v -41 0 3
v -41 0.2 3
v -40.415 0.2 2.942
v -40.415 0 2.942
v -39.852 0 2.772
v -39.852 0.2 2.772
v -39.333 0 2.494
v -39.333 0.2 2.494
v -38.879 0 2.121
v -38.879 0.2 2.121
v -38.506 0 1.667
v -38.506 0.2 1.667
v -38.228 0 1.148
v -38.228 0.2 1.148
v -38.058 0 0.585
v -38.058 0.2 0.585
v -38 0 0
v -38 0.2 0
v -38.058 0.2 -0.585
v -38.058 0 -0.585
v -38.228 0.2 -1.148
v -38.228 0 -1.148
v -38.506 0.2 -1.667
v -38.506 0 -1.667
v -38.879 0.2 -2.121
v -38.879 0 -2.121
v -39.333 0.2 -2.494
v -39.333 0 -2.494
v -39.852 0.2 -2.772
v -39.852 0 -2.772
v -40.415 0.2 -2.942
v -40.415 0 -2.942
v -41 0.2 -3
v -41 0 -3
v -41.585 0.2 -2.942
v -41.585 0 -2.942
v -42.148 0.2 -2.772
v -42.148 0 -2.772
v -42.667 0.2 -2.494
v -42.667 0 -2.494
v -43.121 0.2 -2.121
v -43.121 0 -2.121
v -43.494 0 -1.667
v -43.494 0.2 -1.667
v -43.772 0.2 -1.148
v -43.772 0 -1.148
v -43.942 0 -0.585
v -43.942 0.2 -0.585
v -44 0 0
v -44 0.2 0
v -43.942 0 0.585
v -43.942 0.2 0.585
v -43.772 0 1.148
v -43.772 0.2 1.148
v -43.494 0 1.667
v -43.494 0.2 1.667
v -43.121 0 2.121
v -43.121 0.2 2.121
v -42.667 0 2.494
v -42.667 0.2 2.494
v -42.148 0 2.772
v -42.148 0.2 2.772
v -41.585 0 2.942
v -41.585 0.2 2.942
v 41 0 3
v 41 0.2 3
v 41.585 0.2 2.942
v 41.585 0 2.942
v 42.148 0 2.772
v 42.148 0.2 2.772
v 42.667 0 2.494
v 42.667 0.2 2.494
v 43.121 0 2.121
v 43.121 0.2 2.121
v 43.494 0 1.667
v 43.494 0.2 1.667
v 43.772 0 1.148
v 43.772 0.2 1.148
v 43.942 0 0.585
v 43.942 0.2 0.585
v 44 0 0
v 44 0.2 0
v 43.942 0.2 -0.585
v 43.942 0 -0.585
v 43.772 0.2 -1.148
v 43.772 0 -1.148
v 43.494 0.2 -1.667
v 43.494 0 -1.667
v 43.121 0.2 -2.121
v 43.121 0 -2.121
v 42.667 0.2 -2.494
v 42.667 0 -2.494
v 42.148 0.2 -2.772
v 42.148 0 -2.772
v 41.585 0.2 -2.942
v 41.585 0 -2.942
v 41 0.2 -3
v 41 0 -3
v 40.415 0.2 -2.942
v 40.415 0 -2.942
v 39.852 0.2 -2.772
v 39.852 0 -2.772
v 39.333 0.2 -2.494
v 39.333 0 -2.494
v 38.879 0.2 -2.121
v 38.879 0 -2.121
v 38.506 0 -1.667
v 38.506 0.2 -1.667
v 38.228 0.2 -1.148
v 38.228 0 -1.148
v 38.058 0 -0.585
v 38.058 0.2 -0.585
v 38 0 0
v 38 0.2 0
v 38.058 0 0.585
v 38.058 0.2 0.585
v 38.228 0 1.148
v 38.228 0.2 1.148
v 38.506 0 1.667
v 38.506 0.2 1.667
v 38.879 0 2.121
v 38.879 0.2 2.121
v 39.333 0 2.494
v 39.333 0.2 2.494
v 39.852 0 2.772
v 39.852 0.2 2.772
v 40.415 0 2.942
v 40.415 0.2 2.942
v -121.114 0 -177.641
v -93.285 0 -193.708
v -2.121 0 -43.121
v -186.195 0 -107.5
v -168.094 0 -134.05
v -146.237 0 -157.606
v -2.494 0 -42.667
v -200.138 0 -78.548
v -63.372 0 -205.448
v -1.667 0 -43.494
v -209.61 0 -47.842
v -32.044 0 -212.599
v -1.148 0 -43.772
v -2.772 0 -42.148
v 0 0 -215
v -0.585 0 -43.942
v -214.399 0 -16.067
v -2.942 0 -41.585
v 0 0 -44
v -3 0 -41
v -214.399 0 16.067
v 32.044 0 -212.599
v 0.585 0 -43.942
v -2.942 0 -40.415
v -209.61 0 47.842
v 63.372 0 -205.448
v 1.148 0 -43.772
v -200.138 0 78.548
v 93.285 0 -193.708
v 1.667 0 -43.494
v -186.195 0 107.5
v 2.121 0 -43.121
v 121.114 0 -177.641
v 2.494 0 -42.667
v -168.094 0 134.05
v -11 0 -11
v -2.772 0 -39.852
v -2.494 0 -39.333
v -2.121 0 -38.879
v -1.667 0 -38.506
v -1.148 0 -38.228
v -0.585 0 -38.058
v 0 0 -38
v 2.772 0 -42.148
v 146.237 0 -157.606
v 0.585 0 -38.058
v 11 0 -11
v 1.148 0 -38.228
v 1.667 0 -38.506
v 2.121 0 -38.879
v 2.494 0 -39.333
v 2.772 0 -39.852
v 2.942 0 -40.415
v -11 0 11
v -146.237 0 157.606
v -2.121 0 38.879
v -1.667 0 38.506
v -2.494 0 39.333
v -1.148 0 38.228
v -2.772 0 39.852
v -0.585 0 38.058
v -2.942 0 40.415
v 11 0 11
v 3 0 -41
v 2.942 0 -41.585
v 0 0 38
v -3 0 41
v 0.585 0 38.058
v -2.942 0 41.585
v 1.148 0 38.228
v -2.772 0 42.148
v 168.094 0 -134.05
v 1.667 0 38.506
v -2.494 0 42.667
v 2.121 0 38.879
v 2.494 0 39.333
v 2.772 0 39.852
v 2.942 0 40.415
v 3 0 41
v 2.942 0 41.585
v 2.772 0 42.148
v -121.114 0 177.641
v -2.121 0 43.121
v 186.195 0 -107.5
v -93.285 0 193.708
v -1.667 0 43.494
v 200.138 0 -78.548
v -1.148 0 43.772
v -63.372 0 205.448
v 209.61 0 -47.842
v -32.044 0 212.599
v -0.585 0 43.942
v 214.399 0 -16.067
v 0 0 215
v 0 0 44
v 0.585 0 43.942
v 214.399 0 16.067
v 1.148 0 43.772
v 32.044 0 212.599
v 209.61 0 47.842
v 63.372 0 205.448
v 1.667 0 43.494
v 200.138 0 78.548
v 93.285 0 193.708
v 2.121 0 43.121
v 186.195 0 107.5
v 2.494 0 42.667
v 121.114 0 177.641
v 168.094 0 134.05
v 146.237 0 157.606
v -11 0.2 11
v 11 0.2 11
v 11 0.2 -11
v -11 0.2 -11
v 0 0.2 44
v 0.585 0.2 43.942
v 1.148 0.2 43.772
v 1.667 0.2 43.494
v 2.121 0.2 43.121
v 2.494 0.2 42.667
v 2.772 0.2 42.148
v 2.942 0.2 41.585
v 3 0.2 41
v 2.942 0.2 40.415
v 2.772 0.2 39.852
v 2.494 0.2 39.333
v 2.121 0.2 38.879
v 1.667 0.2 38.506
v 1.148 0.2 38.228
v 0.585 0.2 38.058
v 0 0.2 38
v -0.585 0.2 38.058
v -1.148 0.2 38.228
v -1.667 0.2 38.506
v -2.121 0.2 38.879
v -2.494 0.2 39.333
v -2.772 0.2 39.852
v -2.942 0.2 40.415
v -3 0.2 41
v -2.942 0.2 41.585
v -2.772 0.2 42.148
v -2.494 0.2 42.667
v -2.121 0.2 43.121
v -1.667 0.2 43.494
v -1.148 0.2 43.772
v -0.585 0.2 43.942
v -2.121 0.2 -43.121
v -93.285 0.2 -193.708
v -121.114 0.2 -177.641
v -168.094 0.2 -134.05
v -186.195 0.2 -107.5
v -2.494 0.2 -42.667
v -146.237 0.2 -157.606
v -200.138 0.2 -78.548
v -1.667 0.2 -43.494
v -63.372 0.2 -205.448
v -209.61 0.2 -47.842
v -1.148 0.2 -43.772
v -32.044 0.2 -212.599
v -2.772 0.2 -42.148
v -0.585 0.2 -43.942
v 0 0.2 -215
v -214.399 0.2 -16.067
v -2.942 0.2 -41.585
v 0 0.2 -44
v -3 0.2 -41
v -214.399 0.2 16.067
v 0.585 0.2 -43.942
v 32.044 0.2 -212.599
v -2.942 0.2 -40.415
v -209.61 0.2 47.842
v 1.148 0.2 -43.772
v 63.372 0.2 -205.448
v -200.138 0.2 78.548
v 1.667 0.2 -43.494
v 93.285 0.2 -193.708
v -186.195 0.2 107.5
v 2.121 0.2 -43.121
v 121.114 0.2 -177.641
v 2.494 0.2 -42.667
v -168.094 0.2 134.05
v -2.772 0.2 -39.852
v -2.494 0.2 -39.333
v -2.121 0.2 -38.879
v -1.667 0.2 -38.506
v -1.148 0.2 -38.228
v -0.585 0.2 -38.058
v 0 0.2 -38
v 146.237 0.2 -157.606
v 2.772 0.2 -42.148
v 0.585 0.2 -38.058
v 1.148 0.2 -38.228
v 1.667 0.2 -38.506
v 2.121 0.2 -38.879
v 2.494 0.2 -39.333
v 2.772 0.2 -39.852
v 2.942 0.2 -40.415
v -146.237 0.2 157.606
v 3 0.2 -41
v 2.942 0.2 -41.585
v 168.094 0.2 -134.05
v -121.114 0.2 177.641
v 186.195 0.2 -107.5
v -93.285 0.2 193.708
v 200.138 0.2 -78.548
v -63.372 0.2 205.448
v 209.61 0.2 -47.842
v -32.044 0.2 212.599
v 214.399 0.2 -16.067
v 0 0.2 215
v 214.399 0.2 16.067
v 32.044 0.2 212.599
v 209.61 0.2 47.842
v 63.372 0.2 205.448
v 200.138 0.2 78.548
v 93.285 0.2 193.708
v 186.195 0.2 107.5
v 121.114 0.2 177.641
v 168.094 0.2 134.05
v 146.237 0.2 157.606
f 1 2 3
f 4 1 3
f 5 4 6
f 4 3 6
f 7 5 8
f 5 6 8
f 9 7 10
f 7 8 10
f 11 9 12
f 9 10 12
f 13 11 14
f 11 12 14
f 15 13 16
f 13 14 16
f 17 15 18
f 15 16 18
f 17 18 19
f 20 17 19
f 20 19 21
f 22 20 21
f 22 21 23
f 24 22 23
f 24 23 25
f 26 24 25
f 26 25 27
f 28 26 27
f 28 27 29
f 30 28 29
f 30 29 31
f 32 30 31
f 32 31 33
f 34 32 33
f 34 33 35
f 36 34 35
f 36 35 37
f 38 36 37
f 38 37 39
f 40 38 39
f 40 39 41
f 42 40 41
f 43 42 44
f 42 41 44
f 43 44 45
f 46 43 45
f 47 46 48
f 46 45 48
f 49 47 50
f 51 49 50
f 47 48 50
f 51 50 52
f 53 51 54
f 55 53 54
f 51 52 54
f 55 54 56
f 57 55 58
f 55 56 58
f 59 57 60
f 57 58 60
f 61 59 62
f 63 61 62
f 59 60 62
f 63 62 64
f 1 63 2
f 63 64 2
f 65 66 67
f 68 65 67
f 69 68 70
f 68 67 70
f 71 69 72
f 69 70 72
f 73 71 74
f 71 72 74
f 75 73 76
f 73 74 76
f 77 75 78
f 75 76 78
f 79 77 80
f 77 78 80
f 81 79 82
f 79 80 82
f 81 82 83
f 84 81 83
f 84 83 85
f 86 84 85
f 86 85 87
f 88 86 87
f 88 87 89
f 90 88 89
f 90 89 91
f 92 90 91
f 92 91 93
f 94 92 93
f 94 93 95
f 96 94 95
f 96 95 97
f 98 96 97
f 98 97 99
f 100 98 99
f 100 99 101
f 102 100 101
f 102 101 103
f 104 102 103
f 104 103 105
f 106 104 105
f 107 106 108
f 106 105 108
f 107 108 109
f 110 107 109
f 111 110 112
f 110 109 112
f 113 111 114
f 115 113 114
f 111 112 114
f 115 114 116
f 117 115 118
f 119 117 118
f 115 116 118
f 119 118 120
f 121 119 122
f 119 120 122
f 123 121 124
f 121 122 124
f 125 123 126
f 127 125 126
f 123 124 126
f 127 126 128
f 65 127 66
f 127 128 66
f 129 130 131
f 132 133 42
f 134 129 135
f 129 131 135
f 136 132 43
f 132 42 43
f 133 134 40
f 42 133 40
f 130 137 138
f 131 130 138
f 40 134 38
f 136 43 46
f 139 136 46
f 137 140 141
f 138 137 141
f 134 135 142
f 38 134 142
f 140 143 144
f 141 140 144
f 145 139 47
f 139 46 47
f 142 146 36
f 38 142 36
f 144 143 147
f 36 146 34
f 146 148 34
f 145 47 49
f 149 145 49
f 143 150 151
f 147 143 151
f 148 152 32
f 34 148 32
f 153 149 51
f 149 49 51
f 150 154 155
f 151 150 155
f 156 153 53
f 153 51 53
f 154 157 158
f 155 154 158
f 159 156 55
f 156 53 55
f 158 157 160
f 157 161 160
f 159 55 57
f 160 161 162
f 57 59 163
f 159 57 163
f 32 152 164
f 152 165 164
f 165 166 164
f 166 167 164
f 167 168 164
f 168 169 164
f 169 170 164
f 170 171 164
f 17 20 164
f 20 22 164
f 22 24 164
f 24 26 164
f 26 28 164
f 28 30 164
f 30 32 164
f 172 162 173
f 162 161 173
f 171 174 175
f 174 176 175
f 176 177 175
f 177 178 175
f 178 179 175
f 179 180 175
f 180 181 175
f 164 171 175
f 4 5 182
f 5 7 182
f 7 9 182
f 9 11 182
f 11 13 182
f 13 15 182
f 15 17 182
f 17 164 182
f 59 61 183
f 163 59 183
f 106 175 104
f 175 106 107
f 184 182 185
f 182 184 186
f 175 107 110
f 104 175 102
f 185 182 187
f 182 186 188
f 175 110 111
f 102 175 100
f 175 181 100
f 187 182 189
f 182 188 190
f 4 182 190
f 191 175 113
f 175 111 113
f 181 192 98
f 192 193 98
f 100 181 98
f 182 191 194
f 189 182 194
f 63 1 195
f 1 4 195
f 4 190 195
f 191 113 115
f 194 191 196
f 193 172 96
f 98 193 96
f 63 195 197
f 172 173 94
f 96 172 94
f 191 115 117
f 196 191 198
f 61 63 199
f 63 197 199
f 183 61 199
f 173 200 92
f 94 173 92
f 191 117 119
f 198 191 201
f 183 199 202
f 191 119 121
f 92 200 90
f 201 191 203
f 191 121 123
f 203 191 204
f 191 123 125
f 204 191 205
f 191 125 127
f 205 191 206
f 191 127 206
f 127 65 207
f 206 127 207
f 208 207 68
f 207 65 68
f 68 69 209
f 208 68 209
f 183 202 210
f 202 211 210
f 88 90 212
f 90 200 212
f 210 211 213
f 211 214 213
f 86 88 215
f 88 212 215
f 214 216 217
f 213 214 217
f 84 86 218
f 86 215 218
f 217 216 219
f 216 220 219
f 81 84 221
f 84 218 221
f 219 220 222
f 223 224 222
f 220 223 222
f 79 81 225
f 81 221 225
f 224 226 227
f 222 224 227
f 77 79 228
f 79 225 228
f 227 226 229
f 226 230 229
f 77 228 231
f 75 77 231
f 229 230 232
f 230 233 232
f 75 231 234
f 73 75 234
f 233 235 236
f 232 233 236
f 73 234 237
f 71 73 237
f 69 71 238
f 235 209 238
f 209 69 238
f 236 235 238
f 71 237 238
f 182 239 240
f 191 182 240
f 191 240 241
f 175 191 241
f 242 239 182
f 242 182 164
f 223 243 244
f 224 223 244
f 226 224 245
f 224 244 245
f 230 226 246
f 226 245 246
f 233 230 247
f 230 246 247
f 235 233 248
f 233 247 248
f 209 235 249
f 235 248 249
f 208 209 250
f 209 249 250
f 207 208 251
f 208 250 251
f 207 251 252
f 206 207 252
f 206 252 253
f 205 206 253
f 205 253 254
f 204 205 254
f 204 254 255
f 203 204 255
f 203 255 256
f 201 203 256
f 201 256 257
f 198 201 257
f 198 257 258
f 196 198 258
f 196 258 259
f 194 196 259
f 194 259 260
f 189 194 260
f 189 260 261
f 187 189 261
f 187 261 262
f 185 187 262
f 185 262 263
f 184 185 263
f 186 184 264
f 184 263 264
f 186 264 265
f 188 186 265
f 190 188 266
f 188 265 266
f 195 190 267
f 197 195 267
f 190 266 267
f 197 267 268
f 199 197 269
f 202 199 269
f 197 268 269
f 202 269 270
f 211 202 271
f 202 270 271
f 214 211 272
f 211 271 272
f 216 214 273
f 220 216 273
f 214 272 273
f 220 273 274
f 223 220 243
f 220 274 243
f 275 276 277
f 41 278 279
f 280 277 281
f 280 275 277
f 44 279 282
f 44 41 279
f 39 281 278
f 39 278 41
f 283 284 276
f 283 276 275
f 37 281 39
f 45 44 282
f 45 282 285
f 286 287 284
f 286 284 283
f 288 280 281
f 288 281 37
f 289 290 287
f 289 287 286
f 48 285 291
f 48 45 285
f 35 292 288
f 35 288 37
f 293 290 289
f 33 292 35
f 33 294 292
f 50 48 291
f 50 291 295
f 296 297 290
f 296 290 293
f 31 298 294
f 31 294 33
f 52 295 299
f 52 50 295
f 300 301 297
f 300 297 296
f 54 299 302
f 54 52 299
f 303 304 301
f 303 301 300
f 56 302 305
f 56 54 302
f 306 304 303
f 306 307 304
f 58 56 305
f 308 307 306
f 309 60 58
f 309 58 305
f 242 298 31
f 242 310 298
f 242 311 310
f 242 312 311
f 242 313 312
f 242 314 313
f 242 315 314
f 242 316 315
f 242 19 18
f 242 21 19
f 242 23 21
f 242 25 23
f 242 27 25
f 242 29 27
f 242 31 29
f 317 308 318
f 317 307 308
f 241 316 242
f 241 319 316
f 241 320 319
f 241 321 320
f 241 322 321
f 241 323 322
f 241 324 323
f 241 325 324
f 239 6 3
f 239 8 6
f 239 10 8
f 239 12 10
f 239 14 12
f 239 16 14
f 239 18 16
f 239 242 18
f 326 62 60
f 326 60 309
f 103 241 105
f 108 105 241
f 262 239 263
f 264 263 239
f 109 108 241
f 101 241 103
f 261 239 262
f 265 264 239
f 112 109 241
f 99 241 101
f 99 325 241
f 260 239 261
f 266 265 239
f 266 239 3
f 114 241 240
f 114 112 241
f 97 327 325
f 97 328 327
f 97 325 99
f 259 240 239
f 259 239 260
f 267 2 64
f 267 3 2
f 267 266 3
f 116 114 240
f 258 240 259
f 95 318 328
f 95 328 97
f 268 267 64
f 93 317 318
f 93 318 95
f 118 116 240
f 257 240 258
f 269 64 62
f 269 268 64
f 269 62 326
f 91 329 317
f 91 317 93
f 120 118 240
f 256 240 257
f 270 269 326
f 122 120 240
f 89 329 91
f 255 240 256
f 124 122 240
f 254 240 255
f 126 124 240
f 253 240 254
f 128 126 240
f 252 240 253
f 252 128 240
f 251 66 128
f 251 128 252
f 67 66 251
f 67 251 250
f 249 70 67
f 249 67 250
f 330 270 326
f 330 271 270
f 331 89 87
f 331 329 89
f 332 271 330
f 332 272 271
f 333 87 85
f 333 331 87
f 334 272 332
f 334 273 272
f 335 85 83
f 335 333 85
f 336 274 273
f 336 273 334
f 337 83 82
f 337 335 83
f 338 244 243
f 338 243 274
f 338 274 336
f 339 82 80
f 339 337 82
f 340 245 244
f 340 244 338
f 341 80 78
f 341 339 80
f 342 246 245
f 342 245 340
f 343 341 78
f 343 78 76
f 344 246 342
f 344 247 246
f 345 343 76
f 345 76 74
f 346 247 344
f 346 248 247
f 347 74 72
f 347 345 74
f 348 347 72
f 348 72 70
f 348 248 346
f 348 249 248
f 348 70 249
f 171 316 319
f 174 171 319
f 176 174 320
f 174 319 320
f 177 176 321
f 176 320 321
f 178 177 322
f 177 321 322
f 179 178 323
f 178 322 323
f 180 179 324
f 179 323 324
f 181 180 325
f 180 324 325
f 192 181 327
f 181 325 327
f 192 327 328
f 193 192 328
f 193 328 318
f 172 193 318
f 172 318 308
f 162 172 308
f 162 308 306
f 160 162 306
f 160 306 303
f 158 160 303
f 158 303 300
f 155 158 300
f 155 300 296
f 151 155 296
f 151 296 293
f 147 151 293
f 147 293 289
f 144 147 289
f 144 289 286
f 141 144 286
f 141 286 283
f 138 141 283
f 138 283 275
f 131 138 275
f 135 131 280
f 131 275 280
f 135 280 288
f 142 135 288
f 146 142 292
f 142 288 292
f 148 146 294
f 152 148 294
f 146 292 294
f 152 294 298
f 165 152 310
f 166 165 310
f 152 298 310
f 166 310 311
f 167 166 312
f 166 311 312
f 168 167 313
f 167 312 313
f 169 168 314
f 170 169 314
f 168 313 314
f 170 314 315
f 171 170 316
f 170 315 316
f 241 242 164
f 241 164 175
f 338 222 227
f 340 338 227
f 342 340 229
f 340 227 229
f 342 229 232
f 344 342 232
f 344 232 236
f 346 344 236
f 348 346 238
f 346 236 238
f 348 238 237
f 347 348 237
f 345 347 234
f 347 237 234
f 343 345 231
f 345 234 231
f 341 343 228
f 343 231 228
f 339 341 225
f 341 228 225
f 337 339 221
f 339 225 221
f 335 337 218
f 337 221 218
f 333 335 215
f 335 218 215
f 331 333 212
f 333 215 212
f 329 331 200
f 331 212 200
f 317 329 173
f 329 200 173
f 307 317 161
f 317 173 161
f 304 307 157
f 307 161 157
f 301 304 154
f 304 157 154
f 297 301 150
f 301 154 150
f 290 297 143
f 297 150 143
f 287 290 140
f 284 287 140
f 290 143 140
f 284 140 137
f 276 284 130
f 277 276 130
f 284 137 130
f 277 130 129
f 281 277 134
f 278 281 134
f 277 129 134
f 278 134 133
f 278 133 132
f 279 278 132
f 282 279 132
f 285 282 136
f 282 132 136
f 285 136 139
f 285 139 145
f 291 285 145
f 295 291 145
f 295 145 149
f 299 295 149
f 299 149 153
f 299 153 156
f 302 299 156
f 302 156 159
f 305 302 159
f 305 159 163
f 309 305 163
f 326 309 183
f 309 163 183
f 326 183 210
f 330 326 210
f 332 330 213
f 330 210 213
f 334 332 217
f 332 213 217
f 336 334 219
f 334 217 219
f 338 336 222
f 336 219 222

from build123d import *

# Parameters (mm, degrees)
SKETCH_1_R          = 215
EXTRUDE_1_DEPTH     = 0.2
CUT_EXTRUDE_2_REACH = 306.056
SKETCH_4_R          = 3
SKETCH_4_W          = 22
SKETCH_4_H          = 22


with BuildPart() as part:
    # Эскиз1 → Бобышка-Вытянуть1 (new body)
    with BuildSketch(Plane(origin=(0, 0, 0), x_dir=(1, 0, 0), z_dir=(0, 1, 0))):
        with Locations(Location((0, 0, 0), (0, 0, 270))):
            Circle(SKETCH_1_R)
    extrude(amount=EXTRUDE_1_DEPTH)

    # Эскиз4 → Вырез-Вытянуть2 (cut, up to next)
    with BuildSketch(Plane(origin=(0, 0.2, 0), x_dir=(1, 0, 0), z_dir=(0, 1, 0)), mode=Mode.PRIVATE) as cut_extrude_2_sk1:
        with Locations(Location((0, 41, 0), (0, 0, 270))):
            Circle(SKETCH_4_R)
    cut_extrude_2_tool1 = extrude(cut_extrude_2_sk1.sketch, amount=-CUT_EXTRUDE_2_REACH, mode=Mode.PRIVATE) & part.part
    # Эскиз4 → Вырез-Вытянуть2 (cut, up to next)
    with BuildSketch(Plane(origin=(0, 0.2, 0), x_dir=(1, 0, 0), z_dir=(0, 1, 0)), mode=Mode.PRIVATE) as cut_extrude_2_sk2:
        with Locations(Location((41, 0, 0), (0, 0, 270))):
            Circle(SKETCH_4_R)
    cut_extrude_2_tool2 = extrude(cut_extrude_2_sk2.sketch, amount=-CUT_EXTRUDE_2_REACH, mode=Mode.PRIVATE) & part.part
    # Эскиз4 → Вырез-Вытянуть2 (cut, up to next)
    with BuildSketch(Plane(origin=(0, 0.2, 0), x_dir=(1, 0, 0), z_dir=(0, 1, 0)), mode=Mode.PRIVATE) as cut_extrude_2_sk3:
        with Locations(Location((0, -41, 0), (0, 0, 270))):
            Circle(SKETCH_4_R)
    cut_extrude_2_tool3 = extrude(cut_extrude_2_sk3.sketch, amount=-CUT_EXTRUDE_2_REACH, mode=Mode.PRIVATE) & part.part
    # Эскиз4 → Вырез-Вытянуть2 (cut, up to next)
    with BuildSketch(Plane(origin=(0, 0.2, 0), x_dir=(1, 0, 0), z_dir=(0, 1, 0)), mode=Mode.PRIVATE) as cut_extrude_2_sk4:
        with Locations(Location((-41, 0, 0), (0, 0, 270))):
            Circle(SKETCH_4_R)
    cut_extrude_2_tool4 = extrude(cut_extrude_2_sk4.sketch, amount=-CUT_EXTRUDE_2_REACH, mode=Mode.PRIVATE) & part.part
    # Эскиз4 → Вырез-Вытянуть2 (cut, up to next)
    with BuildSketch(Plane(origin=(0, 0.2, 0), x_dir=(1, 0, 0), z_dir=(0, 1, 0)), mode=Mode.PRIVATE) as cut_extrude_2_sk5:
        Rectangle(SKETCH_4_W, SKETCH_4_H)
    cut_extrude_2_tool5 = extrude(cut_extrude_2_sk5.sketch, amount=-CUT_EXTRUDE_2_REACH, mode=Mode.PRIVATE) & part.part
    add(cut_extrude_2_tool1.solids().sort_by_distance((0, 0.2, -41))[0], mode=Mode.SUBTRACT)
    add(cut_extrude_2_tool2.solids().sort_by_distance((41, 0.2, 0))[0], mode=Mode.SUBTRACT)
    add(cut_extrude_2_tool3.solids().sort_by_distance((0, 0.2, 41))[0], mode=Mode.SUBTRACT)
    add(cut_extrude_2_tool4.solids().sort_by_distance((-41, 0.2, 0))[0], mode=Mode.SUBTRACT)
    add(cut_extrude_2_tool5.solids().sort_by_distance((0, 0.2, 0))[0], mode=Mode.SUBTRACT)


solid = part.part
